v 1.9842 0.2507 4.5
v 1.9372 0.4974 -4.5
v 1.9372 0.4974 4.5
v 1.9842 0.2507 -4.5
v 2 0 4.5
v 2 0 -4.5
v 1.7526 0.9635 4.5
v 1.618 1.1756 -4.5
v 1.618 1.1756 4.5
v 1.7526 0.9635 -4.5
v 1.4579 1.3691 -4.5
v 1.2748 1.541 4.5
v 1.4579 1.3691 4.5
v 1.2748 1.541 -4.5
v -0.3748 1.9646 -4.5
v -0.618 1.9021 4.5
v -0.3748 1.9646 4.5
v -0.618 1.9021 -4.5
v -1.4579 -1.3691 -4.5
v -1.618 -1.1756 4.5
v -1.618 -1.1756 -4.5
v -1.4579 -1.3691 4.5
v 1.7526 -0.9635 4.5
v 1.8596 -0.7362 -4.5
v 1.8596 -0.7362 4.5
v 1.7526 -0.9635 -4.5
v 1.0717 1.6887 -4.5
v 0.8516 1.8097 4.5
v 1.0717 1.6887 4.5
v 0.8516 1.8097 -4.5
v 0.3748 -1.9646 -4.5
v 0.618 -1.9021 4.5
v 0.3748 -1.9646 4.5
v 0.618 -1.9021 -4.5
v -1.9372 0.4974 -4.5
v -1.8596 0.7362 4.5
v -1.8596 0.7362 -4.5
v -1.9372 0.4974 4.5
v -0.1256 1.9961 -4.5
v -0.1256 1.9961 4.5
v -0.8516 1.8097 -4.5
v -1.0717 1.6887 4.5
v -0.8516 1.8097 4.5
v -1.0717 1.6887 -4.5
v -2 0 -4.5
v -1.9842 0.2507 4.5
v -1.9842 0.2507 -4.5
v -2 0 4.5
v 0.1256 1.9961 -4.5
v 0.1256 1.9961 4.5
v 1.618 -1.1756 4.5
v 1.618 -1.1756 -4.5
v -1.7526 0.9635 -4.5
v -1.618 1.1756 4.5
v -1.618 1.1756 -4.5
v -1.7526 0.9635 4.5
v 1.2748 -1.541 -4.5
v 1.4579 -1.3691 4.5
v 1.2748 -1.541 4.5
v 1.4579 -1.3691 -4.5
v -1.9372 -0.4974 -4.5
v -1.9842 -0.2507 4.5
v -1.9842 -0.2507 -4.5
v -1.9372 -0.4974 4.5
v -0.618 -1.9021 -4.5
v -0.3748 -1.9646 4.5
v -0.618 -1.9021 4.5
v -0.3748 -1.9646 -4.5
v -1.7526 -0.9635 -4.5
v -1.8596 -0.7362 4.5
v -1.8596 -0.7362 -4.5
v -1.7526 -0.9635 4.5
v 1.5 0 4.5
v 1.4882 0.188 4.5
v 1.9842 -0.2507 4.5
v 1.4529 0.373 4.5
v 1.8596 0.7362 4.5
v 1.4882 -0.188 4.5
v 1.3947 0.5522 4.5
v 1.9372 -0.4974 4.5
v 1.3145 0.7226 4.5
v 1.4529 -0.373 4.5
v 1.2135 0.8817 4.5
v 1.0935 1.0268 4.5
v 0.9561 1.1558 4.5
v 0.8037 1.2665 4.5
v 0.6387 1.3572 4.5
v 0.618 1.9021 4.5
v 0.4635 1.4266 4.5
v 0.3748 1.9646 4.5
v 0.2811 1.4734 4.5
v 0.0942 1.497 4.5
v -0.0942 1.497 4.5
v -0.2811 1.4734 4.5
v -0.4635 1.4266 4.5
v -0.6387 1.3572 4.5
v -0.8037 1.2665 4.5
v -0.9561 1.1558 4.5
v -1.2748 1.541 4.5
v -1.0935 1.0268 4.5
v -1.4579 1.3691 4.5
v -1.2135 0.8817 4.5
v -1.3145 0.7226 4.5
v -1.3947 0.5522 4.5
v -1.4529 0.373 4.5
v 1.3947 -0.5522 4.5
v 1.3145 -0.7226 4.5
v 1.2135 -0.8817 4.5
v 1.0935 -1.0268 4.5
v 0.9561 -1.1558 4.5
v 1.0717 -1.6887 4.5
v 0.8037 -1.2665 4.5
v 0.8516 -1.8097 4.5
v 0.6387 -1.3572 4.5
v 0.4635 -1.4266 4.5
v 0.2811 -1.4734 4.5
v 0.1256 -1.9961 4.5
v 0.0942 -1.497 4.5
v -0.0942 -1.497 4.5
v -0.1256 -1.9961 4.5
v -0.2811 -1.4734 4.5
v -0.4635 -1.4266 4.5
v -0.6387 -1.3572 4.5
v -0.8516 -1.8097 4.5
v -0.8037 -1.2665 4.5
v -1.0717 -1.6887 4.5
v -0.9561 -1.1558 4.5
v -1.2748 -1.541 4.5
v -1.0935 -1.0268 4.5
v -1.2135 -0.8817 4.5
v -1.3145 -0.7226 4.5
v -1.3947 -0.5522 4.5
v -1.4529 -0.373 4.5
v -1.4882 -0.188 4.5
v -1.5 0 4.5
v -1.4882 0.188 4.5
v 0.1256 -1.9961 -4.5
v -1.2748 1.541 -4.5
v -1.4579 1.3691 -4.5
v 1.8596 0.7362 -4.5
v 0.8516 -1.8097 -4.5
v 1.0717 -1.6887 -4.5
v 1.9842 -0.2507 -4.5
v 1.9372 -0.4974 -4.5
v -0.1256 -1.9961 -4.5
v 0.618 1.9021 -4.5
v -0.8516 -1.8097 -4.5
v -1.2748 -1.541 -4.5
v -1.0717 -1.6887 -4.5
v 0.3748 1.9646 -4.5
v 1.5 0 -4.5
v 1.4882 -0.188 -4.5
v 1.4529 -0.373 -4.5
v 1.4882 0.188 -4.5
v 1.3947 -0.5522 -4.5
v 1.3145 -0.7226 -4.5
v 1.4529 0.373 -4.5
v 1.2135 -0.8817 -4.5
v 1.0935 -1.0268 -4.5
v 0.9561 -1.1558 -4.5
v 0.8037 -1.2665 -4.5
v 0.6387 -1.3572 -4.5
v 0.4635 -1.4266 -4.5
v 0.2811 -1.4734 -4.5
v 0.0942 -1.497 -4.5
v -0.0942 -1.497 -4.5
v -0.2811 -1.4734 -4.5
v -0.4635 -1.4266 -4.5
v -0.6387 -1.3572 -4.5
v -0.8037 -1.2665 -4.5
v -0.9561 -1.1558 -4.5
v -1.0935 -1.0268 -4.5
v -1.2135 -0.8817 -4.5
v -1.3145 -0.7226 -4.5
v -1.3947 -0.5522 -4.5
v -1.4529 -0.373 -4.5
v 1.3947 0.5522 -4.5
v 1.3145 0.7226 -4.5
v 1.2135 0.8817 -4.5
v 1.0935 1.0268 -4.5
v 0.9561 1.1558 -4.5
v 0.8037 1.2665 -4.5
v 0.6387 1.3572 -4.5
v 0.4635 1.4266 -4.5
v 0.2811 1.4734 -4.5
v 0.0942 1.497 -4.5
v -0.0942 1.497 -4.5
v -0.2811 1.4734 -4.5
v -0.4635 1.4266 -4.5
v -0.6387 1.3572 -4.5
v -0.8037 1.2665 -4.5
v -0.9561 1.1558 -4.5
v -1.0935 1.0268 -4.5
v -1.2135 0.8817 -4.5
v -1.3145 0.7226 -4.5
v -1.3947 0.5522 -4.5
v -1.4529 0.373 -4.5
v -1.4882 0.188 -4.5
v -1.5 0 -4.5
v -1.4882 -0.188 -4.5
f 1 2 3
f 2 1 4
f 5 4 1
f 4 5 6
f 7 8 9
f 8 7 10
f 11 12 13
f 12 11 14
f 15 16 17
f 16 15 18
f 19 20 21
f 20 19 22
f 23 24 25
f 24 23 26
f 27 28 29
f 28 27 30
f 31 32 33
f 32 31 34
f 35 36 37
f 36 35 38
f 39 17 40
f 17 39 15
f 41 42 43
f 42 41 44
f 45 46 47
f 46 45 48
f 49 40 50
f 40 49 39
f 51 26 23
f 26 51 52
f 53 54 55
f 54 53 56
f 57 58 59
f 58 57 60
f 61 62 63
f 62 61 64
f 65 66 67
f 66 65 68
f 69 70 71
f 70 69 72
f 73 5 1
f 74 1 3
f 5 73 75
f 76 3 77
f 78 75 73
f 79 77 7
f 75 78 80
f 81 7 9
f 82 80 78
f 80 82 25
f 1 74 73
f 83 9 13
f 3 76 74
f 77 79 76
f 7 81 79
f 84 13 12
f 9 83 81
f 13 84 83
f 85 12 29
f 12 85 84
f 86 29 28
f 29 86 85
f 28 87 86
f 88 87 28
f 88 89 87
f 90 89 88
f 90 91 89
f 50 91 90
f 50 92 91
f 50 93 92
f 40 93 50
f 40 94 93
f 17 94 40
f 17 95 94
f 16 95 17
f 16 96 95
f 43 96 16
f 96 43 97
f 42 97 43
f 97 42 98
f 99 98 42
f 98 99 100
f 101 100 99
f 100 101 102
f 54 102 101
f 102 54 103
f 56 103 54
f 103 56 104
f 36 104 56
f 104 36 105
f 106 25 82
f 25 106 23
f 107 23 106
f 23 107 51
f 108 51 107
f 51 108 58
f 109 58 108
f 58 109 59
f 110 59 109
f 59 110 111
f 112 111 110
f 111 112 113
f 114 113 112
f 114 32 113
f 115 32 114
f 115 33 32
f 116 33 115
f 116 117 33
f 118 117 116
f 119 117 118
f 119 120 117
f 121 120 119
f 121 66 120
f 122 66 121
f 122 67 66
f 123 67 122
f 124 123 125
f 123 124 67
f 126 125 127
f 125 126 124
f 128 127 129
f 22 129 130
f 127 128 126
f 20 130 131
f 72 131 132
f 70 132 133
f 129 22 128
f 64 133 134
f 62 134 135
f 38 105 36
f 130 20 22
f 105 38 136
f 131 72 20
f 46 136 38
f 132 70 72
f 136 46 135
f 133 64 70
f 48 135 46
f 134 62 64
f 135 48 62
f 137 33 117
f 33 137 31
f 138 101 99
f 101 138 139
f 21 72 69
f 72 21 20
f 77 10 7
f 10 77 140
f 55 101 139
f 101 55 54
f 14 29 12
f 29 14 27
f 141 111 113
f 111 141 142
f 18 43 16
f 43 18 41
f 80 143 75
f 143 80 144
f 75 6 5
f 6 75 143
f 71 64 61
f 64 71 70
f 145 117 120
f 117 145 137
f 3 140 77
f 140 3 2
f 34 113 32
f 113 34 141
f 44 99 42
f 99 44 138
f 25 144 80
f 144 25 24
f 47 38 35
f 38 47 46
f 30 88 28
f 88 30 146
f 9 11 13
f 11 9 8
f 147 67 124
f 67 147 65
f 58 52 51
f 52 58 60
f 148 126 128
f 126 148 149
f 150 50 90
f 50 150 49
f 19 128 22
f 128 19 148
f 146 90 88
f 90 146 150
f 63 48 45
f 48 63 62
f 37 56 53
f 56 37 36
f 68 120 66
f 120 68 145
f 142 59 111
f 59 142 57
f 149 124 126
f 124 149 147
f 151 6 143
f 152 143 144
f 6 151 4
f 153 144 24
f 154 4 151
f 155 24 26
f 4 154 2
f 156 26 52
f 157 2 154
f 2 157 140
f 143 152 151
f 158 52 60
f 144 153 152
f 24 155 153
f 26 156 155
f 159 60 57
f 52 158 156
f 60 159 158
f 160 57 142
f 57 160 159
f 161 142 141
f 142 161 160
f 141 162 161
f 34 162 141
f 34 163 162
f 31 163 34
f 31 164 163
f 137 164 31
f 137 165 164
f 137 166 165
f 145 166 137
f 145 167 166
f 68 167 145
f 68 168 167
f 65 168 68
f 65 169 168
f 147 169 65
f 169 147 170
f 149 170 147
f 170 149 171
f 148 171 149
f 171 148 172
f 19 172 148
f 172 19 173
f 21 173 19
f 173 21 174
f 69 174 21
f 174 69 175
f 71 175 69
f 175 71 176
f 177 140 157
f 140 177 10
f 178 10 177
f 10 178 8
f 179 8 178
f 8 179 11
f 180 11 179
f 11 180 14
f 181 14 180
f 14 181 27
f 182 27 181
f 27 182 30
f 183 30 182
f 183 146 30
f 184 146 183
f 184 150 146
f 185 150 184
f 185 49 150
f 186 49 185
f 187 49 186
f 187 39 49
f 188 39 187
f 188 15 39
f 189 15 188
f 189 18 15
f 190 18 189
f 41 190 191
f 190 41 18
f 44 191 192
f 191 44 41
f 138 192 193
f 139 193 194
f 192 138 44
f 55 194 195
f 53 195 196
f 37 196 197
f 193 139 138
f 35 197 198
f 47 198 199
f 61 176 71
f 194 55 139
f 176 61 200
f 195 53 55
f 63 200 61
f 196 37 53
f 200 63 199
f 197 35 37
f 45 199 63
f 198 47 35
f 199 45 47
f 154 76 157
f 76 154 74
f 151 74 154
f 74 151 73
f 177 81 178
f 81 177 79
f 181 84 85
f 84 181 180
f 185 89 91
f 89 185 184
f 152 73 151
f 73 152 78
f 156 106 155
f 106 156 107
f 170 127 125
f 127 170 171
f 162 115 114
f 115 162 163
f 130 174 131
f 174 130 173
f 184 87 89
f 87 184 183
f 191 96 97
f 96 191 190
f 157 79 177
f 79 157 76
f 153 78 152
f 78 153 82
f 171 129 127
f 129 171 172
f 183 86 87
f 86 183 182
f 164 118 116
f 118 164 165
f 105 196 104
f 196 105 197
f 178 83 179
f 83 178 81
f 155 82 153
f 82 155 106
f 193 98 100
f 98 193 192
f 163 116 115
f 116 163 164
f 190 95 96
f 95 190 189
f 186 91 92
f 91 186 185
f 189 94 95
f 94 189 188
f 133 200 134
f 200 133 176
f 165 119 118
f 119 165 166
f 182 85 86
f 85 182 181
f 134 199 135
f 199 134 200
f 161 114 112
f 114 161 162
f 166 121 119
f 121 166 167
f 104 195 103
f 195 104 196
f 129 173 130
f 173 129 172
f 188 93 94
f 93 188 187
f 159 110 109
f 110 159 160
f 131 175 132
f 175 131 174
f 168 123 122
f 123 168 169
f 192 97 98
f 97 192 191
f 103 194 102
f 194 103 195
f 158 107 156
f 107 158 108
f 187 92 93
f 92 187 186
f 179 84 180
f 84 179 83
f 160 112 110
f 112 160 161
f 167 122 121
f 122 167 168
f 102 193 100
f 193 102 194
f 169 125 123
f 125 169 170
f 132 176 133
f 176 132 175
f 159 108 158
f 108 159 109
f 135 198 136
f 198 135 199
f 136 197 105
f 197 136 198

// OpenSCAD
$fn = 50;


difference() {
	union() {
		translate(v = [0, 0, -4.5000000000]) {
			cylinder(h = 9, r = 2.0000000000);
		}
	}
	union() {
		translate(v = [0, 0, -100.0000000000]) {
			cylinder(h = 200, r = 1.5000000000);
		}
	}
}
